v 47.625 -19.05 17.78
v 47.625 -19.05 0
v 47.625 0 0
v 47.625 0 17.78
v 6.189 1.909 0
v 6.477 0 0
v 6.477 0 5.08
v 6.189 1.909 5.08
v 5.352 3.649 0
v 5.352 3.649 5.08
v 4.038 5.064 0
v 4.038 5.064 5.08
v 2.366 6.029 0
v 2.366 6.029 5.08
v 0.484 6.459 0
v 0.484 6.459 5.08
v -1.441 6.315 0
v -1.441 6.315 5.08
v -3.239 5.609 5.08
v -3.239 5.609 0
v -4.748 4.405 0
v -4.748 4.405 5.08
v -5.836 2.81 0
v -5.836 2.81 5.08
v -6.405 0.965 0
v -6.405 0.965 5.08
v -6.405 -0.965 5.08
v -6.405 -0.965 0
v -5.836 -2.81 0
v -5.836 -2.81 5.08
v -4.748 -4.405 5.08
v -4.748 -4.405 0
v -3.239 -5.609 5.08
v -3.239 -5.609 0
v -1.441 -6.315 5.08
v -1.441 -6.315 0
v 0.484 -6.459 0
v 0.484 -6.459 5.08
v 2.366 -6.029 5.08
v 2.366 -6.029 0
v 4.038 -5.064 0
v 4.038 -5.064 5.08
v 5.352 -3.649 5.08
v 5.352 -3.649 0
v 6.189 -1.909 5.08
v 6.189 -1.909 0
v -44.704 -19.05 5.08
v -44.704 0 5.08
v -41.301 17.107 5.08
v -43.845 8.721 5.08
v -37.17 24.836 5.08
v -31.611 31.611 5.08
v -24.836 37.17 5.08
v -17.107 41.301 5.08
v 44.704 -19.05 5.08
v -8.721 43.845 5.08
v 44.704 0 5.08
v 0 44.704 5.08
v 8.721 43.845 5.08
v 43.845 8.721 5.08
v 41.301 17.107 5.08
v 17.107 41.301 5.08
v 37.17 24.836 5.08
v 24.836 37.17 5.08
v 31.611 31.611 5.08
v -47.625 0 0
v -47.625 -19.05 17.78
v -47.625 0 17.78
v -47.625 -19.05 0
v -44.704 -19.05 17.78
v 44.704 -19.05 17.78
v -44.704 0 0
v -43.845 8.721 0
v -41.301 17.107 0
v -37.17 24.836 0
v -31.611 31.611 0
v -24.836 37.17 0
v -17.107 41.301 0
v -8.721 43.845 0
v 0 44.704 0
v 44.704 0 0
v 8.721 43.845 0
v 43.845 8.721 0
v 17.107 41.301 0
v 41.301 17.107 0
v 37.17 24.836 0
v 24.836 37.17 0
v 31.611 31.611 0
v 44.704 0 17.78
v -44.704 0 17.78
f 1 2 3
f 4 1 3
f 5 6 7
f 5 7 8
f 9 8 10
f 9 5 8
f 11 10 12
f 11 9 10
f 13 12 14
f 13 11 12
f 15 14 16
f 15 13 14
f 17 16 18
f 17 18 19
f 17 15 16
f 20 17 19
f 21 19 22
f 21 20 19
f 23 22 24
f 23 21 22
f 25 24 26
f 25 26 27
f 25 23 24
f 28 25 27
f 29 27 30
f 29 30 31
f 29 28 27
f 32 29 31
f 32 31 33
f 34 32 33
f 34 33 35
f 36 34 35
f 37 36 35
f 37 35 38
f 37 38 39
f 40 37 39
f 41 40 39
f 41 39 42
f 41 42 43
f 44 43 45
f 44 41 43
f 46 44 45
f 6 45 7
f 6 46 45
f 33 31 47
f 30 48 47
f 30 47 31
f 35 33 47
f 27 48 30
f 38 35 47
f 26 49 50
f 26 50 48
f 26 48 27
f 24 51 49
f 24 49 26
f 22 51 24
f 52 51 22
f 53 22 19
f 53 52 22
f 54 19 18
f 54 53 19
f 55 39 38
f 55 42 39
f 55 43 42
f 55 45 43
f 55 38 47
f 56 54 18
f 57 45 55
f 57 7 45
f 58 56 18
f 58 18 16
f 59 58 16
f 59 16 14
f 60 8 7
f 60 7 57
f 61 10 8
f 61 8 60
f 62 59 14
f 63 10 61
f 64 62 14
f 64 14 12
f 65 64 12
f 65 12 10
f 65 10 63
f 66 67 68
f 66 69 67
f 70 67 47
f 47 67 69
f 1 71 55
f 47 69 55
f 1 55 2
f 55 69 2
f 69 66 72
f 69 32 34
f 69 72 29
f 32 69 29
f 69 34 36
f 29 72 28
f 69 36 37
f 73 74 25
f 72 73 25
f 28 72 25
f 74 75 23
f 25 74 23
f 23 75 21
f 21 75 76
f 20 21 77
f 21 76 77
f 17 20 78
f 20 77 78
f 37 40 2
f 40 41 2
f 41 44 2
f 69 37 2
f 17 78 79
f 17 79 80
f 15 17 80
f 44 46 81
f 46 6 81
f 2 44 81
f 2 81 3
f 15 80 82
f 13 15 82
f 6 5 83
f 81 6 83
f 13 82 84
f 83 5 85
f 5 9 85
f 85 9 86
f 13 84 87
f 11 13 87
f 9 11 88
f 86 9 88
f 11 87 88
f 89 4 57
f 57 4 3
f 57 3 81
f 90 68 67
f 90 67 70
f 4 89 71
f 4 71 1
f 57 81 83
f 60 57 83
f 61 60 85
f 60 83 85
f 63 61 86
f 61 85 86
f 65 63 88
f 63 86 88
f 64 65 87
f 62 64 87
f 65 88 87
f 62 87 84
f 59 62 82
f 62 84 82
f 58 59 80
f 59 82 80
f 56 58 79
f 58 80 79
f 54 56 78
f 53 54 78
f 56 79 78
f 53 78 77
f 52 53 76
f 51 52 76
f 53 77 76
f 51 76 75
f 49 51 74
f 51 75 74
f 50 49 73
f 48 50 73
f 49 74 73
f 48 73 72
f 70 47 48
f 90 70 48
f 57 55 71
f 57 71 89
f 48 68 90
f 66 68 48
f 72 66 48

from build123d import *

# Parameters (mm, degrees)
F0_R     = 6.477
F1_DEPTH = 5.08
F2_W     = 2.921
F2_H     = 19.05
F3_DEPTH = 12.7


with BuildPart() as f1:
    # F0 (on Top) → F1 (new body)
    with BuildSketch(Plane.XY):
        with BuildLine():
            Line((47.625, 0), (44.704, 0))
            ThreePointArc((44.704, 0), (0, 44.704), (-44.704, 0))
            Line((-44.704, 0), (-47.625, 0))
            Line((-47.625, 0), (-47.625, -19.05))
            Line((-47.625, -19.05), (47.625, -19.05))
            Line((47.625, -19.05), (47.625, 0))
        make_face()
        Circle(F0_R, mode=Mode.SUBTRACT)
    extrude(amount=F1_DEPTH)

    # F2 (on face) → F3 (join)
    with BuildSketch(Plane.XY.offset(5.08)):
        with Locations((-46.1645, -9.525)):
            Rectangle(F2_W, F2_H)
        with Locations((46.1645, -9.525)):
            Rectangle(F2_W, F2_H)
    extrude(amount=F3_DEPTH)


solid = f1.part
